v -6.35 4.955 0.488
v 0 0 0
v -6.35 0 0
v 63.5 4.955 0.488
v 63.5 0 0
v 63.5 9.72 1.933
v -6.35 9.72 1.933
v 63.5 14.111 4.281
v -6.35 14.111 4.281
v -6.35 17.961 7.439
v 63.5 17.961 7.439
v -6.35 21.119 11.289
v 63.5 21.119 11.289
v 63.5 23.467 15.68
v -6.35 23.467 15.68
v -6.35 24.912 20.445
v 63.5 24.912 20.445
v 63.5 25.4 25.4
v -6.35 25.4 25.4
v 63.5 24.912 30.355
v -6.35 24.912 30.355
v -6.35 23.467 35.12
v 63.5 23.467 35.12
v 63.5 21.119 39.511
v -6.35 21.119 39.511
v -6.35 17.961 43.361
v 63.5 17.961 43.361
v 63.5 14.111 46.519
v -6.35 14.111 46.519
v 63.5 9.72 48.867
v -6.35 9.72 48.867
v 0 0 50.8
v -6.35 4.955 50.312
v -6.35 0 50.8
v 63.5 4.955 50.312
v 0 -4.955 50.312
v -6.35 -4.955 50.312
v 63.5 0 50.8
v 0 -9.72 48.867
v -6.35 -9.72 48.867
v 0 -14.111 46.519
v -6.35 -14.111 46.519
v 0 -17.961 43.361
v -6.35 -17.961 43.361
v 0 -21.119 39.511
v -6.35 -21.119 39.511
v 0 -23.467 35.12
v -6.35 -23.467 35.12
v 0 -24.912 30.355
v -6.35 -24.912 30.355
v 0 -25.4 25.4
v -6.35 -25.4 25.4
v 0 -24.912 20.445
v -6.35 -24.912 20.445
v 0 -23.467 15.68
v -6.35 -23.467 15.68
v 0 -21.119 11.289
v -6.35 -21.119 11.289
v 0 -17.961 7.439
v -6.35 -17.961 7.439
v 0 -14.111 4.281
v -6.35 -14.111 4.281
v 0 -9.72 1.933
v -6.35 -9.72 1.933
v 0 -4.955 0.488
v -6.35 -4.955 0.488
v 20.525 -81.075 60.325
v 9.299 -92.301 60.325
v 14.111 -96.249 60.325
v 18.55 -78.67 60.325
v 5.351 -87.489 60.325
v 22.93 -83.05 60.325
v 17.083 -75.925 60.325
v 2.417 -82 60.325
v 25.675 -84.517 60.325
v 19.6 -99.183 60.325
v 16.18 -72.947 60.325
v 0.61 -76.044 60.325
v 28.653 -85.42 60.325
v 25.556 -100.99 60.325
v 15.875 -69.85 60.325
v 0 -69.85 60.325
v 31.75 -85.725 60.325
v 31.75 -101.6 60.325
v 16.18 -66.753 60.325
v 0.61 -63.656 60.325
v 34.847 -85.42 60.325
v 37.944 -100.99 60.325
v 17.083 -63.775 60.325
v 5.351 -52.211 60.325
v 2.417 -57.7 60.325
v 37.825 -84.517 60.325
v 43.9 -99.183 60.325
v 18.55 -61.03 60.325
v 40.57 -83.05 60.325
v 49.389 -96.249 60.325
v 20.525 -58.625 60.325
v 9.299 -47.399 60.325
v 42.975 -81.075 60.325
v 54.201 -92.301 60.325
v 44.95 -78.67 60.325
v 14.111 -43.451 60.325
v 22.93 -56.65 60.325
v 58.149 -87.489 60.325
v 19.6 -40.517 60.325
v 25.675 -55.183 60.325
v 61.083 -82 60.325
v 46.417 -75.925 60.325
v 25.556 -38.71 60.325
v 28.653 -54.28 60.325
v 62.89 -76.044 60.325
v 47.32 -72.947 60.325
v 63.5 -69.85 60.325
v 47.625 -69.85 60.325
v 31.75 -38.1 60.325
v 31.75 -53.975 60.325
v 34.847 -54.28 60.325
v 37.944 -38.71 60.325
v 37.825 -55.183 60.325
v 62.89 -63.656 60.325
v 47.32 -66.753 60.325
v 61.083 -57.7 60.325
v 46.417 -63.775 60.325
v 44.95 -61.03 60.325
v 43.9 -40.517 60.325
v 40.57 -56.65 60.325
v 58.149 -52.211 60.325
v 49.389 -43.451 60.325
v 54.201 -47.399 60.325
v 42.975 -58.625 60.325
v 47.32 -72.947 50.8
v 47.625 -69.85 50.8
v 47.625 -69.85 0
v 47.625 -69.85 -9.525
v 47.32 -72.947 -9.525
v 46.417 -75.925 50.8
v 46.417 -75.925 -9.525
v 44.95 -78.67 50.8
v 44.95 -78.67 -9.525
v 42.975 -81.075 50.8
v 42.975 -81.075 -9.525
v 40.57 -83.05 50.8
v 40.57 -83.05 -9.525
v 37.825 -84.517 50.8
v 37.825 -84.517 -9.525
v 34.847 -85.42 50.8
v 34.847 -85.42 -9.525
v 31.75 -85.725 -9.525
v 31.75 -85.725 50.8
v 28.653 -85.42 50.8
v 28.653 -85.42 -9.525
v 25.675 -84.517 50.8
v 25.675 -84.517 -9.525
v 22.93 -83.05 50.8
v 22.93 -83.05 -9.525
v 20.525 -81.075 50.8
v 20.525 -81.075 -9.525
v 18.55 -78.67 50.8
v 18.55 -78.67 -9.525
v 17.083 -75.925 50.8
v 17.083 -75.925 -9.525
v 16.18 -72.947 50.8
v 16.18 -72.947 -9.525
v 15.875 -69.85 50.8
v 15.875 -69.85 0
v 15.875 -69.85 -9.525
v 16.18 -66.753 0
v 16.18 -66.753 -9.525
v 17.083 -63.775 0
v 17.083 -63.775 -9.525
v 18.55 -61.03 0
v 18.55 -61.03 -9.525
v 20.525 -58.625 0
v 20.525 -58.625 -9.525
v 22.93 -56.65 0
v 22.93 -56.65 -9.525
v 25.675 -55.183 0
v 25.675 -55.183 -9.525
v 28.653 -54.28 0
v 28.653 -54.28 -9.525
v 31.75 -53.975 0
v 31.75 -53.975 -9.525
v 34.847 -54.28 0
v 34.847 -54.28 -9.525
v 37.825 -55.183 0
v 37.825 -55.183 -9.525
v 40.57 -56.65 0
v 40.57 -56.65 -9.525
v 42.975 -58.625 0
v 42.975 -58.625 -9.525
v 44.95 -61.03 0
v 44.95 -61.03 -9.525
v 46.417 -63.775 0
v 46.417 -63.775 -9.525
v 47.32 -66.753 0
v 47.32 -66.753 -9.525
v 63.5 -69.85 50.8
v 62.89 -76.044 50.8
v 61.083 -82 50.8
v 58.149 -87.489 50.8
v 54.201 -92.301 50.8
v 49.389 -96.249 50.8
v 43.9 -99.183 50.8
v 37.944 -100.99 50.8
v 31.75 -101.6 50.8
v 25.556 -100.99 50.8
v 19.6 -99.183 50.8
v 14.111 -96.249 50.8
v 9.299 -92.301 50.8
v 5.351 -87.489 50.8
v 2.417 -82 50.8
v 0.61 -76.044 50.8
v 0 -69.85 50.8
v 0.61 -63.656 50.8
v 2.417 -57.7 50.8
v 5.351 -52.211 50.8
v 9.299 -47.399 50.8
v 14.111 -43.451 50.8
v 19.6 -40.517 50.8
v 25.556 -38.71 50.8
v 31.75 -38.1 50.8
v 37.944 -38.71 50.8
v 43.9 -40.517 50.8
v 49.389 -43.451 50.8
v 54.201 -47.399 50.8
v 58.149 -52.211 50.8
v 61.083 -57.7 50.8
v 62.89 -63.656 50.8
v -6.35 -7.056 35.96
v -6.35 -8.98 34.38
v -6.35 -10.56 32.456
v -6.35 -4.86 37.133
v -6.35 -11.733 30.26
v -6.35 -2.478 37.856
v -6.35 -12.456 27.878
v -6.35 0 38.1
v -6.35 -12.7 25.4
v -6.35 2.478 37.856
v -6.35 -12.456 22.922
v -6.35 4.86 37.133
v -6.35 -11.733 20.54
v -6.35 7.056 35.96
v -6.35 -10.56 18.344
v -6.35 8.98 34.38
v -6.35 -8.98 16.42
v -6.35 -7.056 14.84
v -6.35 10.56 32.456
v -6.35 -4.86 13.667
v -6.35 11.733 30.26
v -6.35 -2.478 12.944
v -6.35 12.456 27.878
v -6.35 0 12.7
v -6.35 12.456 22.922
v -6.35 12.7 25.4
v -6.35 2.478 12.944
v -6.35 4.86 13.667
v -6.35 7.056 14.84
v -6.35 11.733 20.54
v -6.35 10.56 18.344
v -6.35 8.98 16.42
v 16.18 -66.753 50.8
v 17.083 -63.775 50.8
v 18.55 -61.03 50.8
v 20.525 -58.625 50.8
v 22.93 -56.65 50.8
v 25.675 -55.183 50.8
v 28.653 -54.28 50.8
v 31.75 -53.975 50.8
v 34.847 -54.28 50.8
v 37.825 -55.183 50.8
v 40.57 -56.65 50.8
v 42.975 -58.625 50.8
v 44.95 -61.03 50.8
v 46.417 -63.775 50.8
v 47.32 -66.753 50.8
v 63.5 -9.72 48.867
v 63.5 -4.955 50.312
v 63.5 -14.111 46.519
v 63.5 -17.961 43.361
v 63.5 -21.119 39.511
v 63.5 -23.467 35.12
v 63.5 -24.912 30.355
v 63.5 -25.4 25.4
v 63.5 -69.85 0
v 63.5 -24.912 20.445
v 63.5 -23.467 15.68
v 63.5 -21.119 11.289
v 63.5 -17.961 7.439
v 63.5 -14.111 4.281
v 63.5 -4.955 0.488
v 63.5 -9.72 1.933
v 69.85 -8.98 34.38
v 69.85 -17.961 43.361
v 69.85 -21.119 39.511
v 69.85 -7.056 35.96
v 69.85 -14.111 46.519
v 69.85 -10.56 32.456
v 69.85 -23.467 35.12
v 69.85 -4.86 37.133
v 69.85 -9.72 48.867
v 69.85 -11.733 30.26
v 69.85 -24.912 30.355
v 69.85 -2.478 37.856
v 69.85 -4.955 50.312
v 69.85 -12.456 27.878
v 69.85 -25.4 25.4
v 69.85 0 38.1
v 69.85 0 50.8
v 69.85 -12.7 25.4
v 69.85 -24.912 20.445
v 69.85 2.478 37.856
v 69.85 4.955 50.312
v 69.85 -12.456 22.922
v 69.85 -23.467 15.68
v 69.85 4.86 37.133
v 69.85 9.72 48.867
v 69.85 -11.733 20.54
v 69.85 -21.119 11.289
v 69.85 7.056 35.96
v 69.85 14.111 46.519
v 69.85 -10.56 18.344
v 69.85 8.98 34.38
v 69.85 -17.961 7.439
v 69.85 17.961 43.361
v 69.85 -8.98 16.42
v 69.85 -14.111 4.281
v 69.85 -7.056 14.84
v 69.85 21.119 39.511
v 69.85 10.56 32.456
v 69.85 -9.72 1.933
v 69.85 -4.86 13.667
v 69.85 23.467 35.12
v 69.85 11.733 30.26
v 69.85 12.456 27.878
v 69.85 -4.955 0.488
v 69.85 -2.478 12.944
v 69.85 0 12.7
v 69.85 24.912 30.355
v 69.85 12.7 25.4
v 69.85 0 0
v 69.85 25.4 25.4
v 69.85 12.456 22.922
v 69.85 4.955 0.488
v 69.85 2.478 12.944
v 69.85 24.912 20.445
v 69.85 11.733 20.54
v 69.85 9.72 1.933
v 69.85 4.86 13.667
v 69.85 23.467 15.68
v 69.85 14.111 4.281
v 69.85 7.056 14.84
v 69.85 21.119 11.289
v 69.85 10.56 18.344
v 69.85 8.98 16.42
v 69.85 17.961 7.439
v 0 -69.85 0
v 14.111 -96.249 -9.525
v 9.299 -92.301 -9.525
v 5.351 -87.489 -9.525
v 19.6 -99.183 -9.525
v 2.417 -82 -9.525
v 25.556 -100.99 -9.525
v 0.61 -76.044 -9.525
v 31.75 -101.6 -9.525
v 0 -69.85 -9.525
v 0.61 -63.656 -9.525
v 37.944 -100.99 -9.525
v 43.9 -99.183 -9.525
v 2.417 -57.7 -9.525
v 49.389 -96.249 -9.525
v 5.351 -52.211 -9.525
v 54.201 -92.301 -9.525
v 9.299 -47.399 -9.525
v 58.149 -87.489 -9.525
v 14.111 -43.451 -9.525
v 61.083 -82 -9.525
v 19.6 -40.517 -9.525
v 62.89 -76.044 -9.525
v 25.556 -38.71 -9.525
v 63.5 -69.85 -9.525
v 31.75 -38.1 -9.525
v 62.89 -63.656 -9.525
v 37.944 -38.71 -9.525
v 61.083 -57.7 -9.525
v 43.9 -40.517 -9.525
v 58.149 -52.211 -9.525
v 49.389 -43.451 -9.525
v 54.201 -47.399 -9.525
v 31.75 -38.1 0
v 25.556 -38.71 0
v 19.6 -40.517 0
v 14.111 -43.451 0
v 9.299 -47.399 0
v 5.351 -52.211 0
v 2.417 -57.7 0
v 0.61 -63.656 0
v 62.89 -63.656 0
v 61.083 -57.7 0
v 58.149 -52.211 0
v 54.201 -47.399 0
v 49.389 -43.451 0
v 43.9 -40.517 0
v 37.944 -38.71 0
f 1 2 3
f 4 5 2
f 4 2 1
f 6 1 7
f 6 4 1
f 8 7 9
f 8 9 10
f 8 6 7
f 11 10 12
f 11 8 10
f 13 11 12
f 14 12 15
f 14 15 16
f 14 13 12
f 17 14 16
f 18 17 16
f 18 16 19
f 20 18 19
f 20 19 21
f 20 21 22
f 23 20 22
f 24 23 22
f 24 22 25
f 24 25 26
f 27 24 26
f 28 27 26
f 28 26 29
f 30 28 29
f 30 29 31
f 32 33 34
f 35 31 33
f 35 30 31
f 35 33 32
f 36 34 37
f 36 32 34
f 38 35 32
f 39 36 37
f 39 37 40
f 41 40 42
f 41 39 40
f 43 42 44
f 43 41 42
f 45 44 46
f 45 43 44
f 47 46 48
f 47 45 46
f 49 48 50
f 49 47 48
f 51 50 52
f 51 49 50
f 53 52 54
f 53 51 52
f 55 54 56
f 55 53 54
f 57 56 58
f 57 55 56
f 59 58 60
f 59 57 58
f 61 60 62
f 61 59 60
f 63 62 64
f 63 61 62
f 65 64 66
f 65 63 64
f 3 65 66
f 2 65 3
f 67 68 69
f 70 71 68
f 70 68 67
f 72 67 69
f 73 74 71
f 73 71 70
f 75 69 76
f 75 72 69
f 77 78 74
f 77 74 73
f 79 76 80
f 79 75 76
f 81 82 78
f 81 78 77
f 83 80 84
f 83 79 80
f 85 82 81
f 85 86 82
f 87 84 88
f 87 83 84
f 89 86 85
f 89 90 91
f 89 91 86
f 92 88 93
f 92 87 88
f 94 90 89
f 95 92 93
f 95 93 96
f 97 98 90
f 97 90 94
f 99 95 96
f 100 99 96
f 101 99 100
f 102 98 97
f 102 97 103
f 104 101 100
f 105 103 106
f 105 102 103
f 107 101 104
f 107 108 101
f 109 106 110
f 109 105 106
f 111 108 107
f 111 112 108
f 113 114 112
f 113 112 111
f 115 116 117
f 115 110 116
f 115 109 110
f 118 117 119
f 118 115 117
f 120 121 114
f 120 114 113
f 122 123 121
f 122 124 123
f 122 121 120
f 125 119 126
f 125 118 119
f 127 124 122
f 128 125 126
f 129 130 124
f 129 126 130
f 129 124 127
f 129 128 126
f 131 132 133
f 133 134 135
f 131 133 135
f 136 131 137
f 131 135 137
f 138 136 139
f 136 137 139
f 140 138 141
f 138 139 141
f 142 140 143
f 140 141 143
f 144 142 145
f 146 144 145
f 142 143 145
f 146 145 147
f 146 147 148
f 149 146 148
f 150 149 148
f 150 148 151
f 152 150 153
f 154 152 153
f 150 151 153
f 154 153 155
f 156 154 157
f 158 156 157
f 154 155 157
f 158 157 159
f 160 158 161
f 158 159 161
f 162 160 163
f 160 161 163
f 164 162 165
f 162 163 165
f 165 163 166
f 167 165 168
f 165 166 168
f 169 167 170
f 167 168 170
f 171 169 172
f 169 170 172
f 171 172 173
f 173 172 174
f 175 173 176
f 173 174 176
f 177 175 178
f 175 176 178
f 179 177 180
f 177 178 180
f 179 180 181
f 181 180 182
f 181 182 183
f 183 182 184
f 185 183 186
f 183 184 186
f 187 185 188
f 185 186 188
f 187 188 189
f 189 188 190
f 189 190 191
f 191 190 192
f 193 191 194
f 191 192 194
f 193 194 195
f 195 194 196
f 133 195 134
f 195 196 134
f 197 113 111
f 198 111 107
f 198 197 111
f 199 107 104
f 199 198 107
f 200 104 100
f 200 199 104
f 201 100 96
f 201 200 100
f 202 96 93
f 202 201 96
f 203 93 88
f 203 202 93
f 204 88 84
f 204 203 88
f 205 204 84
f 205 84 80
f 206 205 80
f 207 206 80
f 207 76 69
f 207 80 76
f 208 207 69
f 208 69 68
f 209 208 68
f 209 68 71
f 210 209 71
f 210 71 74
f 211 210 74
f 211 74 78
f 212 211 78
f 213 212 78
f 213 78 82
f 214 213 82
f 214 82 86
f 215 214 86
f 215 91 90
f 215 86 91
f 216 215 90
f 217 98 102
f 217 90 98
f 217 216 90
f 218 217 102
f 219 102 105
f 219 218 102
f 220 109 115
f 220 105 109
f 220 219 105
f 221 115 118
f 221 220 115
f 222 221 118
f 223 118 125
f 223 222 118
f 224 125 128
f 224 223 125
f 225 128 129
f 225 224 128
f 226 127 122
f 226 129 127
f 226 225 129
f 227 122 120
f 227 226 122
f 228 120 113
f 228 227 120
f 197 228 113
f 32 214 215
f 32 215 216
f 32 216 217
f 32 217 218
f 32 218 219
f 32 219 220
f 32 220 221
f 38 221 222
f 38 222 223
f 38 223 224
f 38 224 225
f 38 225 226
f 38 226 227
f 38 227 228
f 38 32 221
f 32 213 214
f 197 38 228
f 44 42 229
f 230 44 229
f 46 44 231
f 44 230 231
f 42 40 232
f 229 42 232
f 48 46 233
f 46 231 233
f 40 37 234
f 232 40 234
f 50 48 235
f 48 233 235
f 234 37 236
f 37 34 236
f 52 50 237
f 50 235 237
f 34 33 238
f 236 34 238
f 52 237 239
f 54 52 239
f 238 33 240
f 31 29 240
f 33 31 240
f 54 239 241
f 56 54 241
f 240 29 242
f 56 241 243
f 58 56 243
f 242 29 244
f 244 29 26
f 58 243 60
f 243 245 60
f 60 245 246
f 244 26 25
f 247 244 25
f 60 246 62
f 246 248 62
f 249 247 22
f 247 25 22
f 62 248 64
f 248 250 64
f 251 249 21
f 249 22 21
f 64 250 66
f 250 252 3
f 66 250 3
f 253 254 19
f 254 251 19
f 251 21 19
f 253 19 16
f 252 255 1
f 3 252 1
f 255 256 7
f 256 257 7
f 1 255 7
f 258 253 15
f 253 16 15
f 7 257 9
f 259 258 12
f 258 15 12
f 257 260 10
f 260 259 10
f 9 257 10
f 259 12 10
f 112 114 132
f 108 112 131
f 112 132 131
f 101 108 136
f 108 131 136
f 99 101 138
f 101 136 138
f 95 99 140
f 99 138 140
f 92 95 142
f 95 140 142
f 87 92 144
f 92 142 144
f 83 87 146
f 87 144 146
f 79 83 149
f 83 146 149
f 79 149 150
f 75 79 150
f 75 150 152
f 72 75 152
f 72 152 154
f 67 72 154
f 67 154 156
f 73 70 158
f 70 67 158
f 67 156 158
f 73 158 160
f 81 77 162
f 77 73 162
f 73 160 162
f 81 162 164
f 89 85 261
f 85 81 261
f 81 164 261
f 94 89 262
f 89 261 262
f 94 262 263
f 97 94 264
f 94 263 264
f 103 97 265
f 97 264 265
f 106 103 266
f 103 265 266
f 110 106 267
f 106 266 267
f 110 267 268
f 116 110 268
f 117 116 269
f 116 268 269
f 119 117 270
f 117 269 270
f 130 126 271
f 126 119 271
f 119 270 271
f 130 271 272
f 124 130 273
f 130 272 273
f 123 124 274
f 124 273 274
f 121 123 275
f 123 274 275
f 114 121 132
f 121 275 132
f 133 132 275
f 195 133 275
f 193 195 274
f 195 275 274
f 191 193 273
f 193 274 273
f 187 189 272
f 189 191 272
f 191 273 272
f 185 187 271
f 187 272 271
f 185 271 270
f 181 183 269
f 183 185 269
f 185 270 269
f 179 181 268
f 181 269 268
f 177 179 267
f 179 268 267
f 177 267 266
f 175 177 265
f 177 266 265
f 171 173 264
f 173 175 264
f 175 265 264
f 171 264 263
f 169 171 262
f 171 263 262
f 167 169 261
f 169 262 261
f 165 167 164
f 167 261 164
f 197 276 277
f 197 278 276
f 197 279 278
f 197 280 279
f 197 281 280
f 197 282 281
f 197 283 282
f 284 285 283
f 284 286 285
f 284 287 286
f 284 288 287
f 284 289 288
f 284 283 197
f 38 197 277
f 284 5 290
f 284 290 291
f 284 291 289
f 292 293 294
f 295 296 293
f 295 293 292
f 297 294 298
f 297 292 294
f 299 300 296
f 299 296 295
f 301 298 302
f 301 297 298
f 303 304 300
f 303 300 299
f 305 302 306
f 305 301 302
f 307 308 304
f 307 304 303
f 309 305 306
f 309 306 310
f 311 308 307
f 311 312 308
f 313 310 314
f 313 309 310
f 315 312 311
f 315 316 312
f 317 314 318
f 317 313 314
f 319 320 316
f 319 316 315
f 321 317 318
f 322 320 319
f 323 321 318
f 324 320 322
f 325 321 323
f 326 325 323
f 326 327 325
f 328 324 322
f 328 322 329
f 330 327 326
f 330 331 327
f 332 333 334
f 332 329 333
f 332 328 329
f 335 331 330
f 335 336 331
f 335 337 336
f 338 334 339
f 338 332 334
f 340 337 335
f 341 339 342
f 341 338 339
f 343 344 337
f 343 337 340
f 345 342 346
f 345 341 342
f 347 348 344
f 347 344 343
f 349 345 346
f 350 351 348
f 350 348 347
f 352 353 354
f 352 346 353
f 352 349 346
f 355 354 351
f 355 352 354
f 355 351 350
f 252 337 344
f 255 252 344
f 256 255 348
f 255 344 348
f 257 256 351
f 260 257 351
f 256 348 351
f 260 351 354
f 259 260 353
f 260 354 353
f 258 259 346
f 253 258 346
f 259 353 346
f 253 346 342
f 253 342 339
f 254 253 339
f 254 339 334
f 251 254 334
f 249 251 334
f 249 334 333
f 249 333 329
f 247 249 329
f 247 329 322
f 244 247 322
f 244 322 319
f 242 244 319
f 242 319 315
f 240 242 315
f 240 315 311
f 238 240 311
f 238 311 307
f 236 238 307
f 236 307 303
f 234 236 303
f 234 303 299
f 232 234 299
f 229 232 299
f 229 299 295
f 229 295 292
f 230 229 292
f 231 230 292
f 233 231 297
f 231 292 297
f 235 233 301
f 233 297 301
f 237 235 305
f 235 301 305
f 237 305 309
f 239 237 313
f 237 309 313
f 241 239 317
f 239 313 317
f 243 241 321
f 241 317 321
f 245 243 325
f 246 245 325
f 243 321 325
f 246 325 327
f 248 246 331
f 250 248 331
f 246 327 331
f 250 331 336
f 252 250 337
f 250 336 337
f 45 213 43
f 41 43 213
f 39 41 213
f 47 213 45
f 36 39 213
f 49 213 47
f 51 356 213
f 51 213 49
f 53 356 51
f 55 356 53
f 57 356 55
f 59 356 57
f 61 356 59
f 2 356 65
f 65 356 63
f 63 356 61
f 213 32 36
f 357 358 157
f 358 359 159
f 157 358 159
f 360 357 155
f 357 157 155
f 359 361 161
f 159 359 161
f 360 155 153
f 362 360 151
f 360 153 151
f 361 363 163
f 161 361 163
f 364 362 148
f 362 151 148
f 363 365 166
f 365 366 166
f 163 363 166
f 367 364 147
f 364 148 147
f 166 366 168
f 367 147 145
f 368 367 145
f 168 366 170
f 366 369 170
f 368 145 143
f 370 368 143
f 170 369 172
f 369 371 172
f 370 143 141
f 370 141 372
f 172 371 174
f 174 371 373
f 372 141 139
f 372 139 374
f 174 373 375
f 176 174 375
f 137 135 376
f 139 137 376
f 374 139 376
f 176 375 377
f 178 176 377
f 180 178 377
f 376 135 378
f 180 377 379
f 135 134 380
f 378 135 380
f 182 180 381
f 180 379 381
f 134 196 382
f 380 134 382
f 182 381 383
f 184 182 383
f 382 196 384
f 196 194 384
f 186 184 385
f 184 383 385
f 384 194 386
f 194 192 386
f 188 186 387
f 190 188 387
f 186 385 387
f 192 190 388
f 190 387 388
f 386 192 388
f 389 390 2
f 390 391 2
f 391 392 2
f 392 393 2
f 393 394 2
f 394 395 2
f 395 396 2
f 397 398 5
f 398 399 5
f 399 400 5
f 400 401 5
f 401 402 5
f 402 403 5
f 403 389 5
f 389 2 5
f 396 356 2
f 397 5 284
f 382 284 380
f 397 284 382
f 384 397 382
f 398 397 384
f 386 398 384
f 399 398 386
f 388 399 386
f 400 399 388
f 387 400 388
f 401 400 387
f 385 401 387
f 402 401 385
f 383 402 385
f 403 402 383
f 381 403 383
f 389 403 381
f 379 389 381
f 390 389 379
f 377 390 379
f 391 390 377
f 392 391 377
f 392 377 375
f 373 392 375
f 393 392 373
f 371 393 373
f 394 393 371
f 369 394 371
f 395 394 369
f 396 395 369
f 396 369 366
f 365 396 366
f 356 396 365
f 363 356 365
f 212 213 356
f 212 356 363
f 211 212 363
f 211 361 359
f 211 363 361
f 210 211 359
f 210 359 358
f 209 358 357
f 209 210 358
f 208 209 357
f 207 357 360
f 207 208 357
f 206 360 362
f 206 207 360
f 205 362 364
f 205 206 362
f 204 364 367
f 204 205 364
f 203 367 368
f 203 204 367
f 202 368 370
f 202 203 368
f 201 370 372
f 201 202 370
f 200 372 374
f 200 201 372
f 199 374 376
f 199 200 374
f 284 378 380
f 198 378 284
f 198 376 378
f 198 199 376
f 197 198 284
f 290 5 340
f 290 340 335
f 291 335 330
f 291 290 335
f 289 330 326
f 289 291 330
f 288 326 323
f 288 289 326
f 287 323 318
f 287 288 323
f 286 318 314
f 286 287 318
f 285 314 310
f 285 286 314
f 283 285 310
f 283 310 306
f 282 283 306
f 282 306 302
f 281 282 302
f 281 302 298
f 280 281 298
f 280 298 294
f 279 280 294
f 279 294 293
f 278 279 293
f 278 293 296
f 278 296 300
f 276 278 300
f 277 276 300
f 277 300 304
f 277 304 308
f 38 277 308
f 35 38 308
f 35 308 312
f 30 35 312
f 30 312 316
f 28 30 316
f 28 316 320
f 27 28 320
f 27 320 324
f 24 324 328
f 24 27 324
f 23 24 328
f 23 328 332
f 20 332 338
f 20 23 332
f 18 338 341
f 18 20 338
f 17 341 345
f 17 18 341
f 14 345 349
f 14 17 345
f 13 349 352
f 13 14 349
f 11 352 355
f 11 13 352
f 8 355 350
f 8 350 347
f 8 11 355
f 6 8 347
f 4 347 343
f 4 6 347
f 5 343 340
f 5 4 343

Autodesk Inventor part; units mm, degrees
ref_plane "YZ Plane" through (0, 0, 0) normal (1, 0, 0) x (0, 1, 0)
ref_plane "XZ Plane" through (0, 0, 0) normal (0, 1, 0) x (-1, 0, 0)
ref_plane "XY Plane" through (0, 0, 0) normal (0, 0, 1) x (1, 0, 0)
sketch "Sketch1" plane through (0, 0, 0) normal (0, 0, 1) x (1, 0, 0)
  line L0 (0, 0) -> (63.5, 0)
  line L1 (63.5, 0) -> (63.5, -69.85)
  line L2 (63.5, -69.85) -> (0, -69.85)
  line L3 (0, -69.85) -> (0, 0)
  dimension "d0" = 63.5
  dimension "d1" = 69.85
  dimension "d2" = 63.5
extrude "Extrusion1" add sketch "Sketch1" along normal blind 50.8
sketch "Sketch2" plane through (0, 0, 50.8) normal (0, 0, 1) x (1, 0, 0)
  line L0 (0, -69.85) -> (63.5, -69.85) projected
  circle A0 centre (31.75, -69.85) radius 31.75
  circle A1 centre (31.75, -69.85) radius 15.875
  point P0 (0, 0)
  dimension "d5" = 31.75
extrude "Extrusion2" add sketch "Sketch2" along normal blind 9.525 and the other way blind 60.325 contours A1 L0 A0 | L0 A0 A1
sketch "Sketch3" plane through (63.5, 0, 50.8) normal (1, 0, 0) x (0, 0, -1)
  point P0 (50.8, 0)
sketch "Sketch4" plane through (0, 0, 50.8) normal (0, 0, 1) x (1, 0, 0)
  line L0 (47.625, -69.85) -> (15.875, -69.85) projected
  circle A0 centre (31.75, -69.85) radius 15.875
  point P0 (0, 0)
  dimension "d10" = 31.75
sketch "Sketch5" plane through (0, 0, 50.8) normal (0, 0, 1) x (1, 0, 0)
  point P0 (0, 0)
extrude "Extrusion3" cut sketch "Sketch4" against normal through all
sketch "Sketch6" plane through (63.5, 0, 50.8) normal (1, 0, 0) x (0, 0, -1)
  line L0 (50.8, 0) -> (0, 0) projected
  circle A0 centre (25.4, 0) radius 25.4
  dimension "d13" = 50.8
extrude "Extrusion4" add sketch "Sketch6" along normal blind 6.35 and the other way blind 69.85
sketch "Sketch7" plane through (69.85, 0, 25.4) normal (1, 0, 0) x (0, 0, -1)
  circle A0 centre (0, 0) radius 12.7
  point P0 (25.4, 0)
  dimension "d18" = 25.4
extrude "Extrusion5" cut sketch "Sketch7" against normal through all
properties part number "HW 6 Part 5"
